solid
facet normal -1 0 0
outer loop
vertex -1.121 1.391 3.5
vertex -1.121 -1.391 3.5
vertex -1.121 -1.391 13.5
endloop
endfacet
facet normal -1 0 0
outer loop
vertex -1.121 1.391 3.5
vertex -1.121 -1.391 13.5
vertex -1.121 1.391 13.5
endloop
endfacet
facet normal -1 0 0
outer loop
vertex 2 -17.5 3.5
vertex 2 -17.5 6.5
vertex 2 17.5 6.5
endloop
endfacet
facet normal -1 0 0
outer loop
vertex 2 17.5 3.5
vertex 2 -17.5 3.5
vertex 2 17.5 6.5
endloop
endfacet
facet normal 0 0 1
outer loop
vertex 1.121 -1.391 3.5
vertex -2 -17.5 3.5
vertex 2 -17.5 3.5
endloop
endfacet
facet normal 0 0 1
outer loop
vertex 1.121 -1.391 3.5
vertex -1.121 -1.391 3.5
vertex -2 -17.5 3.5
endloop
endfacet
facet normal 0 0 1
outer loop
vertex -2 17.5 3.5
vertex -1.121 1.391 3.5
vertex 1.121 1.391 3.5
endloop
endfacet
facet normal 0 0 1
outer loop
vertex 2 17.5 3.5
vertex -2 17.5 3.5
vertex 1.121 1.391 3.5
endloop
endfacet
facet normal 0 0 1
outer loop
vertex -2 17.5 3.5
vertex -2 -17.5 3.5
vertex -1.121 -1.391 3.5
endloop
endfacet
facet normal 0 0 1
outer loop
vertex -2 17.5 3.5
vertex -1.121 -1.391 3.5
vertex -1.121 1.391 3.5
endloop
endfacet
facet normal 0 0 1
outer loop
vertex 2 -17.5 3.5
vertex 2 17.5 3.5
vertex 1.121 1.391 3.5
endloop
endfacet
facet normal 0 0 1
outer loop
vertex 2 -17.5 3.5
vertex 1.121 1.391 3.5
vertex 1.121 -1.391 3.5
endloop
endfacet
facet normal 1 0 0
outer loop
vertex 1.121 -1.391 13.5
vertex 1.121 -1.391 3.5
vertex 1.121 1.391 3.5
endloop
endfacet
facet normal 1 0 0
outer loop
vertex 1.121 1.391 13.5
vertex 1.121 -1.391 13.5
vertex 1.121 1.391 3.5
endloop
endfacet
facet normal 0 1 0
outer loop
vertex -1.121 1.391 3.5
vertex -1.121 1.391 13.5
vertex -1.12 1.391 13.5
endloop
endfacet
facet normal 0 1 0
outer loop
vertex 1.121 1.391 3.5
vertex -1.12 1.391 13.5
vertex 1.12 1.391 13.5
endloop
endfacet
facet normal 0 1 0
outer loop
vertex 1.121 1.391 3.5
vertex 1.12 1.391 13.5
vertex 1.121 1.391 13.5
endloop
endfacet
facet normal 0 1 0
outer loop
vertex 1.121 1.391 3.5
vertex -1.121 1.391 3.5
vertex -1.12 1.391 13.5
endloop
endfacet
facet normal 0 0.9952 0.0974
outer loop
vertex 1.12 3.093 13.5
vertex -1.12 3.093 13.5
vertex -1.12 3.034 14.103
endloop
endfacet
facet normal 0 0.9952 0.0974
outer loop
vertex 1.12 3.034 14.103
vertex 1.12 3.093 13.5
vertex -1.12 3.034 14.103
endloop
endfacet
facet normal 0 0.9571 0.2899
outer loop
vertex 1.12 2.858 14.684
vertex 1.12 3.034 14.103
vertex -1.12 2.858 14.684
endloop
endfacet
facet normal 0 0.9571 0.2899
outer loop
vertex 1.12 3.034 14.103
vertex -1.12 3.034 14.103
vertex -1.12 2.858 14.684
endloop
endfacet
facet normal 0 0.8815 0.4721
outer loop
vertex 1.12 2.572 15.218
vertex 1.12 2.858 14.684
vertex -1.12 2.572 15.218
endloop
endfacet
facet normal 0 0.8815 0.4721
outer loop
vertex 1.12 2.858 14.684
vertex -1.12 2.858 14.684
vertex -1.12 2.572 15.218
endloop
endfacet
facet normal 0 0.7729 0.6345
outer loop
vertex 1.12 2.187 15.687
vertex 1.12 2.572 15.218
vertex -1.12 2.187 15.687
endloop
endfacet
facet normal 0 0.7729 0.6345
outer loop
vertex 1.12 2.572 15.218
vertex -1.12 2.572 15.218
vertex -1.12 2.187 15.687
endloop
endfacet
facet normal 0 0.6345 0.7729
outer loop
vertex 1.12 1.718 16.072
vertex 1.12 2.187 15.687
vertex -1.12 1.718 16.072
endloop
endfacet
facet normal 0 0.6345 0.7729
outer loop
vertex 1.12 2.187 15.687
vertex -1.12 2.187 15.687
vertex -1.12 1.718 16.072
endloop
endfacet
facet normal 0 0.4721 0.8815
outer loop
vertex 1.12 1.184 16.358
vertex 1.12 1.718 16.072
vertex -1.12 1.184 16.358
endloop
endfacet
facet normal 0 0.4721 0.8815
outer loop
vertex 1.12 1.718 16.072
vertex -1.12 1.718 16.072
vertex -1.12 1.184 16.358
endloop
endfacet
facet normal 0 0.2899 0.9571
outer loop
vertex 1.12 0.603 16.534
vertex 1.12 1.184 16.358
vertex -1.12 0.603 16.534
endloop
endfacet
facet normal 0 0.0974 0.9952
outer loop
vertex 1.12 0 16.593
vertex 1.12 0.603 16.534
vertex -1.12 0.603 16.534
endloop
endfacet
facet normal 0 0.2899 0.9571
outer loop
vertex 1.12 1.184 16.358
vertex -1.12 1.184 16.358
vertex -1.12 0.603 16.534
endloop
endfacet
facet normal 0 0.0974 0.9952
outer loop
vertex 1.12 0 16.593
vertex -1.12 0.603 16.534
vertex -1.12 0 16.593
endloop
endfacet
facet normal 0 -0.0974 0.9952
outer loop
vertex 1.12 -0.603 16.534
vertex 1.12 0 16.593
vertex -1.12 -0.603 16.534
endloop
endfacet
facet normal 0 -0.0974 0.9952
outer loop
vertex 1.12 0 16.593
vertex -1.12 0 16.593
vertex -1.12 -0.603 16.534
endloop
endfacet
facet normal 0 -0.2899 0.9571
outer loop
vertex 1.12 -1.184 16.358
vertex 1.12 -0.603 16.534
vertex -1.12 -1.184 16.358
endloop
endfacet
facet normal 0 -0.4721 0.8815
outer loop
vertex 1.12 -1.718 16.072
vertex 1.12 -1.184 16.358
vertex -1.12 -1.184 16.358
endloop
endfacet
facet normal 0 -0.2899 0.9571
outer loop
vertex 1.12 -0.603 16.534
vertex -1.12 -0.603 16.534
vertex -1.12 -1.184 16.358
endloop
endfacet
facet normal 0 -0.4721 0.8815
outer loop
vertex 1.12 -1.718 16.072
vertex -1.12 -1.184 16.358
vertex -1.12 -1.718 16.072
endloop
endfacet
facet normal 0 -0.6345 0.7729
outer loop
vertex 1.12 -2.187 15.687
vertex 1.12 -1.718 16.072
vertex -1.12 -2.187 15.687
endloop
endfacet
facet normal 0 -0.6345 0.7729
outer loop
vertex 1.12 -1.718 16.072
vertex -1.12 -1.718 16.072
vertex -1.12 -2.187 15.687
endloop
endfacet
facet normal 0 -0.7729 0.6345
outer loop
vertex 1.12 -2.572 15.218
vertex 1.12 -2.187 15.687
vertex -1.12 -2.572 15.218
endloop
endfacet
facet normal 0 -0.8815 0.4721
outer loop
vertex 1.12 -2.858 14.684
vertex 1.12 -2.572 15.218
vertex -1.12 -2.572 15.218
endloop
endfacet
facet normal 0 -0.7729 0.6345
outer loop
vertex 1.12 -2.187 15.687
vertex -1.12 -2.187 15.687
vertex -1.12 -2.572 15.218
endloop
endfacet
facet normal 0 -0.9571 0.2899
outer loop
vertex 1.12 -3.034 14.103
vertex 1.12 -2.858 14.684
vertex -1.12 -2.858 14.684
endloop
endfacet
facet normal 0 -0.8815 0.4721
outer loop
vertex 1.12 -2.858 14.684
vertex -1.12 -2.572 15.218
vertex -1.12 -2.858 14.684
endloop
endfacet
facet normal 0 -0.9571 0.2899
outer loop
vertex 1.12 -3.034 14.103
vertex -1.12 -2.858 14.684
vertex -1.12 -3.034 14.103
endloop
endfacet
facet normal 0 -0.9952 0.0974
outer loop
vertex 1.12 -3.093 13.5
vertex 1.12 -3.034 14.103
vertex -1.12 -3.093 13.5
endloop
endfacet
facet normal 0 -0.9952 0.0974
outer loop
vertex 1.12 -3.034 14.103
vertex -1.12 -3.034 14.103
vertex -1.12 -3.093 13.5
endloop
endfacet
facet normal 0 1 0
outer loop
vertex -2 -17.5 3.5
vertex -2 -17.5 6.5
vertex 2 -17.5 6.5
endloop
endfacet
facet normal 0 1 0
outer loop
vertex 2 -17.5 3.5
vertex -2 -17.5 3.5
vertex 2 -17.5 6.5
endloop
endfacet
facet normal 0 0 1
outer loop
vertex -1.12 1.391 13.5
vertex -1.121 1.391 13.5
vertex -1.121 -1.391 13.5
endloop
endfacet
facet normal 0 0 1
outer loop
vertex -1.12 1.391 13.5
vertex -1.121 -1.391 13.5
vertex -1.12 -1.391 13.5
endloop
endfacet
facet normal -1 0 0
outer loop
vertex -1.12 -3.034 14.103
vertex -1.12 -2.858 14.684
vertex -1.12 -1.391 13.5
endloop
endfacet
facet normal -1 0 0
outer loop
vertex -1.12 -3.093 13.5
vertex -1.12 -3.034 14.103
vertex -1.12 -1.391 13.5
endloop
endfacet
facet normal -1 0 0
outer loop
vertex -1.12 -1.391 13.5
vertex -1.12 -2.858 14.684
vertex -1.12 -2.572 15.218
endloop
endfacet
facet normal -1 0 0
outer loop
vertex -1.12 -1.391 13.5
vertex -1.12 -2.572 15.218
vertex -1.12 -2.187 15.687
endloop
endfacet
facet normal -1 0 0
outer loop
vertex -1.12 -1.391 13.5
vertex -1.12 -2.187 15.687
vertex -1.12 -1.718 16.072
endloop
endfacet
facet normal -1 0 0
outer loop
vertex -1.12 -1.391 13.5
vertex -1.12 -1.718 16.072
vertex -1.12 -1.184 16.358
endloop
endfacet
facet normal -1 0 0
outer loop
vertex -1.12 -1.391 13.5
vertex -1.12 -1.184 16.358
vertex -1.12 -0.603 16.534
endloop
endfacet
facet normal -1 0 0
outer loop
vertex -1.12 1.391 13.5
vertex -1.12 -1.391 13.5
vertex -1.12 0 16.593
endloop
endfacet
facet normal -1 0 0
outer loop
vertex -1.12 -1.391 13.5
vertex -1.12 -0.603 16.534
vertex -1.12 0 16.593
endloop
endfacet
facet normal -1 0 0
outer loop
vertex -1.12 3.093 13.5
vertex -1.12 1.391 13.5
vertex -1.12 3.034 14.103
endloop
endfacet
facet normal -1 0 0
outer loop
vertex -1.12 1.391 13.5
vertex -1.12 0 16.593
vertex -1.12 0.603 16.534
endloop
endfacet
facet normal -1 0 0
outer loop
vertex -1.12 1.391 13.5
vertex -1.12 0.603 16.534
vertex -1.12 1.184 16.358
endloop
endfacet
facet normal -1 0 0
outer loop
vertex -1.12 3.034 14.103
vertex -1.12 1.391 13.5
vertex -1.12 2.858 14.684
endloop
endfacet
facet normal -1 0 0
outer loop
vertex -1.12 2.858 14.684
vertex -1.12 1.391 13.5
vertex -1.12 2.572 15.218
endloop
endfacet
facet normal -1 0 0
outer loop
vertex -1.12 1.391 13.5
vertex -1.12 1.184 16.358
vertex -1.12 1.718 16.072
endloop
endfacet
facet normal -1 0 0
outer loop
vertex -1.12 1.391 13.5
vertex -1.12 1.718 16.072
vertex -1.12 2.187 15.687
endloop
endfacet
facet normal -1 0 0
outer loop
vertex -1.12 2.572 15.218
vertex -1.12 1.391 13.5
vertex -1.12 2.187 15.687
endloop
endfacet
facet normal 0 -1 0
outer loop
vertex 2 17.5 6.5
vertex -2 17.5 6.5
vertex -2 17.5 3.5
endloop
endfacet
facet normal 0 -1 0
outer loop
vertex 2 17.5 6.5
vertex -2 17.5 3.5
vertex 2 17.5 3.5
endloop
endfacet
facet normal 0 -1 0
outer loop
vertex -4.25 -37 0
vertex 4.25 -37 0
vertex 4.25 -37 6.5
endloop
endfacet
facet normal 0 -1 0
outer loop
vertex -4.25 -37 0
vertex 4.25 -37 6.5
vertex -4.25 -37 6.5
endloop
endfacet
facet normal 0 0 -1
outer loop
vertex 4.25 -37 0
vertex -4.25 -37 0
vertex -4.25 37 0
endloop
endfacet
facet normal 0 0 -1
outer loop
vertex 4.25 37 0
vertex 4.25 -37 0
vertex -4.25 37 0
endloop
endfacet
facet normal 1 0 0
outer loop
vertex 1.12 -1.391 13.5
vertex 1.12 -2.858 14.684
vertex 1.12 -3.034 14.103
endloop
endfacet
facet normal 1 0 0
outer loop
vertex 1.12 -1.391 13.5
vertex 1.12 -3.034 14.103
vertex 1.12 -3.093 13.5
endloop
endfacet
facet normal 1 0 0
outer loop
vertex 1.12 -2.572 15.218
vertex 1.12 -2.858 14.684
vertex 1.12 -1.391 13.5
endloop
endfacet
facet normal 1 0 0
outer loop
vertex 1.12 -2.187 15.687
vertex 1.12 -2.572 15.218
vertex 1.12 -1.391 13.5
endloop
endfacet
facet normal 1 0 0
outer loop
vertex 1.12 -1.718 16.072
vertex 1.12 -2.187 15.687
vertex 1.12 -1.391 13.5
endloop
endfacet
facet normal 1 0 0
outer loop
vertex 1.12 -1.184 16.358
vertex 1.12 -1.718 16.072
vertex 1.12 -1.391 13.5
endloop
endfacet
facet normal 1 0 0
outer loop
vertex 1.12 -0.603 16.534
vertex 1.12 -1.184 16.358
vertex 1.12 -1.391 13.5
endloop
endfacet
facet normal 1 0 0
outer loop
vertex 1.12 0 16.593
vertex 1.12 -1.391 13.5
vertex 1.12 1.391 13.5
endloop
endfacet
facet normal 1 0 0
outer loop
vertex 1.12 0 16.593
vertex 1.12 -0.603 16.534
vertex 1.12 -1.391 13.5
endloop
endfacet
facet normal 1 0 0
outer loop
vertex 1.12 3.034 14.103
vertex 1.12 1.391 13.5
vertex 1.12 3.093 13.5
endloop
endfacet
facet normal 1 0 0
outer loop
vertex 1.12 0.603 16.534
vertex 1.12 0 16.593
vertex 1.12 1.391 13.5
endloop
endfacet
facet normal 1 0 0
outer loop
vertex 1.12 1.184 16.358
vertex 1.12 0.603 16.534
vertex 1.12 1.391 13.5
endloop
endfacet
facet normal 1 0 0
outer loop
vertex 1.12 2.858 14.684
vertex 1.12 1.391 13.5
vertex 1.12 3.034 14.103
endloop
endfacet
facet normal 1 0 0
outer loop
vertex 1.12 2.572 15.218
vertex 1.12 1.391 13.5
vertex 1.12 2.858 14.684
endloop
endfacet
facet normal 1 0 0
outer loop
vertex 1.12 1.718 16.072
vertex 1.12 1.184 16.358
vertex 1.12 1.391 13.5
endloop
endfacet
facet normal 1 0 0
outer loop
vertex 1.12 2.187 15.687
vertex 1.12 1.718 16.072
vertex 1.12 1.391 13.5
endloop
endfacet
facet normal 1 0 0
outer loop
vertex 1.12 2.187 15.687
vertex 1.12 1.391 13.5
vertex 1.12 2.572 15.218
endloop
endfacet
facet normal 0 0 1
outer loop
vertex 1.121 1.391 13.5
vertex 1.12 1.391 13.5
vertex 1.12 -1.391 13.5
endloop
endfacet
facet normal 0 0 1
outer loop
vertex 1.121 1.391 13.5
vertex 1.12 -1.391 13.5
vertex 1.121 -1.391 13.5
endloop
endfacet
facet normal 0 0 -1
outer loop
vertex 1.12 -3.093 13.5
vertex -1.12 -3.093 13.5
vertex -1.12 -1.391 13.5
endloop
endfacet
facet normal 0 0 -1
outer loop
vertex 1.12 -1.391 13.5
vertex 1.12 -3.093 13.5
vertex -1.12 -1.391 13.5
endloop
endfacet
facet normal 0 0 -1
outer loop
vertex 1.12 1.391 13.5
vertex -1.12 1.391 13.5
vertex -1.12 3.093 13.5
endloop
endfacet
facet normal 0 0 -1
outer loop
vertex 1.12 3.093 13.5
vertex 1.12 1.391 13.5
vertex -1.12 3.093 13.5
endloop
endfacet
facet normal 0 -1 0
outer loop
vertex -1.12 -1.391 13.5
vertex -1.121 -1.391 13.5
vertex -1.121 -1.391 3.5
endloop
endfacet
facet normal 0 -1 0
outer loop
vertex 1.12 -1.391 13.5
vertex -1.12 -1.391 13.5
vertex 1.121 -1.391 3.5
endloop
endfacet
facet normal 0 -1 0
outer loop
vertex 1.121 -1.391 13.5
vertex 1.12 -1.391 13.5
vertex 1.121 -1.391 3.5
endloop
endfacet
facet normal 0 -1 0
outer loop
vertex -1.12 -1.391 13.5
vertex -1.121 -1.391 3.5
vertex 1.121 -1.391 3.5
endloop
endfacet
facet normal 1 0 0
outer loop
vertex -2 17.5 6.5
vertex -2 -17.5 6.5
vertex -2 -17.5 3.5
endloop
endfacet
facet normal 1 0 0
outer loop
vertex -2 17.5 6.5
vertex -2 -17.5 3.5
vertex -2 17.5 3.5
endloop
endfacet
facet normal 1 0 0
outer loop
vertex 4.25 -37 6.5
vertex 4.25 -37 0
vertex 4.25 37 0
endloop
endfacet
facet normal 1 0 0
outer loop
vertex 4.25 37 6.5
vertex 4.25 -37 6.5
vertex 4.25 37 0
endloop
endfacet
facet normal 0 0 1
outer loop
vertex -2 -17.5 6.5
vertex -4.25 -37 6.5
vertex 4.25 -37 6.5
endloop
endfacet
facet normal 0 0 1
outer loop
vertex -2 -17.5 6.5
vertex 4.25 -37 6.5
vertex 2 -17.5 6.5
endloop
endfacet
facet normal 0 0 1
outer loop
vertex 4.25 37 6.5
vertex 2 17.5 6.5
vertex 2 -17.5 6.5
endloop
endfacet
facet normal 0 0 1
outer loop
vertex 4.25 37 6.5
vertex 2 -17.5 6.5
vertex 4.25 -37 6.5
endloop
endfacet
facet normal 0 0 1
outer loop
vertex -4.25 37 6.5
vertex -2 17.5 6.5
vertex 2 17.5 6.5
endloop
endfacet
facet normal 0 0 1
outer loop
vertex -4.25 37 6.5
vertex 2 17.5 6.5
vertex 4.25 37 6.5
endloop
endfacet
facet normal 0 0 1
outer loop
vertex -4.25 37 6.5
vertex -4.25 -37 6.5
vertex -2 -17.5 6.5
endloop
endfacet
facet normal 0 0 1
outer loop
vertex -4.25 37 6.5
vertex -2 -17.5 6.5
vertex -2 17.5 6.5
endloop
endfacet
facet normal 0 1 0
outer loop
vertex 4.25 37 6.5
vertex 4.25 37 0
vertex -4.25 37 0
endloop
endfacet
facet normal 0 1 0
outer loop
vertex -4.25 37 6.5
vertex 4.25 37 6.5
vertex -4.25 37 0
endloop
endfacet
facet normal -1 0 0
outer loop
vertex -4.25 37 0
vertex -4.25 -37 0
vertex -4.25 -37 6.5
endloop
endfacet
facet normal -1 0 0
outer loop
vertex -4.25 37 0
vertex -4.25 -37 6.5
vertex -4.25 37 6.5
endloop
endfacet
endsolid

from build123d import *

# Parameters (mm, degrees)
SKETCH1_W           = 74
SKETCH1_H           = 8.5
BOSS_EXTRUDE1_DEPTH = 6.5
SKETCH2_W           = 4
SKETCH2_H           = 35
CUT_EXTRUDE1_DEPTH  = 3
SKETCH3_W           = 2.242776622
SKETCH3_H           = 2.782449956
BOSS_EXTRUDE2_DEPTH = 10
BOSS_EXTRUDE3_DEPTH = 1.12
BOSS_EXTRUDE5_START = 1.12
BOSS_EXTRUDE5_DEPTH = 1.12


with BuildPart() as part:
    # Sketch1 → Boss-Extrude1 (new body)
    with BuildSketch(Plane(origin=(0, 0, 0), x_dir=(0, 1, 0), z_dir=(0, 0, 1))):
        Rectangle(SKETCH1_W, SKETCH1_H)
    extrude(amount=BOSS_EXTRUDE1_DEPTH)

    # Sketch2 → Cut-Extrude1 (cut)
    with BuildSketch(Plane.XY.offset(6.5)):
        Rectangle(SKETCH2_W, SKETCH2_H)
    extrude(amount=-CUT_EXTRUDE1_DEPTH, mode=Mode.SUBTRACT)

    # Sketch3 → Boss-Extrude2 (add)
    with BuildSketch(Plane.XY.offset(3.5)):
        Rectangle(SKETCH3_W, SKETCH3_H)
    extrude(amount=BOSS_EXTRUDE2_DEPTH)

    # Sketch4 → Boss-Extrude3 (add)
    with BuildSketch(Plane.YZ):
        with BuildLine():
            Line((-3.093095713, 13.5), (3.093095713, 13.5))
            ThreePointArc((3.093095713, 13.5), (0, 16.593095713), (-3.093095713, 13.5))
        make_face()
    extrude(amount=BOSS_EXTRUDE3_DEPTH)

    # Sketch10 → Boss-Extrude5 (add)
    with BuildSketch(Plane(origin=(0, 0, 0), x_dir=(0, -1, 0), z_dir=(-1, 0, 0)).offset(BOSS_EXTRUDE5_START)):
        with BuildLine():
            Line((3.093095713, 13.5), (-3.093095713, 13.5))
            ThreePointArc((-3.093095713, 13.5), (0, 16.593095713), (3.093095713, 13.5))
        make_face()
    extrude(amount=-BOSS_EXTRUDE5_DEPTH)


solid = part.part
